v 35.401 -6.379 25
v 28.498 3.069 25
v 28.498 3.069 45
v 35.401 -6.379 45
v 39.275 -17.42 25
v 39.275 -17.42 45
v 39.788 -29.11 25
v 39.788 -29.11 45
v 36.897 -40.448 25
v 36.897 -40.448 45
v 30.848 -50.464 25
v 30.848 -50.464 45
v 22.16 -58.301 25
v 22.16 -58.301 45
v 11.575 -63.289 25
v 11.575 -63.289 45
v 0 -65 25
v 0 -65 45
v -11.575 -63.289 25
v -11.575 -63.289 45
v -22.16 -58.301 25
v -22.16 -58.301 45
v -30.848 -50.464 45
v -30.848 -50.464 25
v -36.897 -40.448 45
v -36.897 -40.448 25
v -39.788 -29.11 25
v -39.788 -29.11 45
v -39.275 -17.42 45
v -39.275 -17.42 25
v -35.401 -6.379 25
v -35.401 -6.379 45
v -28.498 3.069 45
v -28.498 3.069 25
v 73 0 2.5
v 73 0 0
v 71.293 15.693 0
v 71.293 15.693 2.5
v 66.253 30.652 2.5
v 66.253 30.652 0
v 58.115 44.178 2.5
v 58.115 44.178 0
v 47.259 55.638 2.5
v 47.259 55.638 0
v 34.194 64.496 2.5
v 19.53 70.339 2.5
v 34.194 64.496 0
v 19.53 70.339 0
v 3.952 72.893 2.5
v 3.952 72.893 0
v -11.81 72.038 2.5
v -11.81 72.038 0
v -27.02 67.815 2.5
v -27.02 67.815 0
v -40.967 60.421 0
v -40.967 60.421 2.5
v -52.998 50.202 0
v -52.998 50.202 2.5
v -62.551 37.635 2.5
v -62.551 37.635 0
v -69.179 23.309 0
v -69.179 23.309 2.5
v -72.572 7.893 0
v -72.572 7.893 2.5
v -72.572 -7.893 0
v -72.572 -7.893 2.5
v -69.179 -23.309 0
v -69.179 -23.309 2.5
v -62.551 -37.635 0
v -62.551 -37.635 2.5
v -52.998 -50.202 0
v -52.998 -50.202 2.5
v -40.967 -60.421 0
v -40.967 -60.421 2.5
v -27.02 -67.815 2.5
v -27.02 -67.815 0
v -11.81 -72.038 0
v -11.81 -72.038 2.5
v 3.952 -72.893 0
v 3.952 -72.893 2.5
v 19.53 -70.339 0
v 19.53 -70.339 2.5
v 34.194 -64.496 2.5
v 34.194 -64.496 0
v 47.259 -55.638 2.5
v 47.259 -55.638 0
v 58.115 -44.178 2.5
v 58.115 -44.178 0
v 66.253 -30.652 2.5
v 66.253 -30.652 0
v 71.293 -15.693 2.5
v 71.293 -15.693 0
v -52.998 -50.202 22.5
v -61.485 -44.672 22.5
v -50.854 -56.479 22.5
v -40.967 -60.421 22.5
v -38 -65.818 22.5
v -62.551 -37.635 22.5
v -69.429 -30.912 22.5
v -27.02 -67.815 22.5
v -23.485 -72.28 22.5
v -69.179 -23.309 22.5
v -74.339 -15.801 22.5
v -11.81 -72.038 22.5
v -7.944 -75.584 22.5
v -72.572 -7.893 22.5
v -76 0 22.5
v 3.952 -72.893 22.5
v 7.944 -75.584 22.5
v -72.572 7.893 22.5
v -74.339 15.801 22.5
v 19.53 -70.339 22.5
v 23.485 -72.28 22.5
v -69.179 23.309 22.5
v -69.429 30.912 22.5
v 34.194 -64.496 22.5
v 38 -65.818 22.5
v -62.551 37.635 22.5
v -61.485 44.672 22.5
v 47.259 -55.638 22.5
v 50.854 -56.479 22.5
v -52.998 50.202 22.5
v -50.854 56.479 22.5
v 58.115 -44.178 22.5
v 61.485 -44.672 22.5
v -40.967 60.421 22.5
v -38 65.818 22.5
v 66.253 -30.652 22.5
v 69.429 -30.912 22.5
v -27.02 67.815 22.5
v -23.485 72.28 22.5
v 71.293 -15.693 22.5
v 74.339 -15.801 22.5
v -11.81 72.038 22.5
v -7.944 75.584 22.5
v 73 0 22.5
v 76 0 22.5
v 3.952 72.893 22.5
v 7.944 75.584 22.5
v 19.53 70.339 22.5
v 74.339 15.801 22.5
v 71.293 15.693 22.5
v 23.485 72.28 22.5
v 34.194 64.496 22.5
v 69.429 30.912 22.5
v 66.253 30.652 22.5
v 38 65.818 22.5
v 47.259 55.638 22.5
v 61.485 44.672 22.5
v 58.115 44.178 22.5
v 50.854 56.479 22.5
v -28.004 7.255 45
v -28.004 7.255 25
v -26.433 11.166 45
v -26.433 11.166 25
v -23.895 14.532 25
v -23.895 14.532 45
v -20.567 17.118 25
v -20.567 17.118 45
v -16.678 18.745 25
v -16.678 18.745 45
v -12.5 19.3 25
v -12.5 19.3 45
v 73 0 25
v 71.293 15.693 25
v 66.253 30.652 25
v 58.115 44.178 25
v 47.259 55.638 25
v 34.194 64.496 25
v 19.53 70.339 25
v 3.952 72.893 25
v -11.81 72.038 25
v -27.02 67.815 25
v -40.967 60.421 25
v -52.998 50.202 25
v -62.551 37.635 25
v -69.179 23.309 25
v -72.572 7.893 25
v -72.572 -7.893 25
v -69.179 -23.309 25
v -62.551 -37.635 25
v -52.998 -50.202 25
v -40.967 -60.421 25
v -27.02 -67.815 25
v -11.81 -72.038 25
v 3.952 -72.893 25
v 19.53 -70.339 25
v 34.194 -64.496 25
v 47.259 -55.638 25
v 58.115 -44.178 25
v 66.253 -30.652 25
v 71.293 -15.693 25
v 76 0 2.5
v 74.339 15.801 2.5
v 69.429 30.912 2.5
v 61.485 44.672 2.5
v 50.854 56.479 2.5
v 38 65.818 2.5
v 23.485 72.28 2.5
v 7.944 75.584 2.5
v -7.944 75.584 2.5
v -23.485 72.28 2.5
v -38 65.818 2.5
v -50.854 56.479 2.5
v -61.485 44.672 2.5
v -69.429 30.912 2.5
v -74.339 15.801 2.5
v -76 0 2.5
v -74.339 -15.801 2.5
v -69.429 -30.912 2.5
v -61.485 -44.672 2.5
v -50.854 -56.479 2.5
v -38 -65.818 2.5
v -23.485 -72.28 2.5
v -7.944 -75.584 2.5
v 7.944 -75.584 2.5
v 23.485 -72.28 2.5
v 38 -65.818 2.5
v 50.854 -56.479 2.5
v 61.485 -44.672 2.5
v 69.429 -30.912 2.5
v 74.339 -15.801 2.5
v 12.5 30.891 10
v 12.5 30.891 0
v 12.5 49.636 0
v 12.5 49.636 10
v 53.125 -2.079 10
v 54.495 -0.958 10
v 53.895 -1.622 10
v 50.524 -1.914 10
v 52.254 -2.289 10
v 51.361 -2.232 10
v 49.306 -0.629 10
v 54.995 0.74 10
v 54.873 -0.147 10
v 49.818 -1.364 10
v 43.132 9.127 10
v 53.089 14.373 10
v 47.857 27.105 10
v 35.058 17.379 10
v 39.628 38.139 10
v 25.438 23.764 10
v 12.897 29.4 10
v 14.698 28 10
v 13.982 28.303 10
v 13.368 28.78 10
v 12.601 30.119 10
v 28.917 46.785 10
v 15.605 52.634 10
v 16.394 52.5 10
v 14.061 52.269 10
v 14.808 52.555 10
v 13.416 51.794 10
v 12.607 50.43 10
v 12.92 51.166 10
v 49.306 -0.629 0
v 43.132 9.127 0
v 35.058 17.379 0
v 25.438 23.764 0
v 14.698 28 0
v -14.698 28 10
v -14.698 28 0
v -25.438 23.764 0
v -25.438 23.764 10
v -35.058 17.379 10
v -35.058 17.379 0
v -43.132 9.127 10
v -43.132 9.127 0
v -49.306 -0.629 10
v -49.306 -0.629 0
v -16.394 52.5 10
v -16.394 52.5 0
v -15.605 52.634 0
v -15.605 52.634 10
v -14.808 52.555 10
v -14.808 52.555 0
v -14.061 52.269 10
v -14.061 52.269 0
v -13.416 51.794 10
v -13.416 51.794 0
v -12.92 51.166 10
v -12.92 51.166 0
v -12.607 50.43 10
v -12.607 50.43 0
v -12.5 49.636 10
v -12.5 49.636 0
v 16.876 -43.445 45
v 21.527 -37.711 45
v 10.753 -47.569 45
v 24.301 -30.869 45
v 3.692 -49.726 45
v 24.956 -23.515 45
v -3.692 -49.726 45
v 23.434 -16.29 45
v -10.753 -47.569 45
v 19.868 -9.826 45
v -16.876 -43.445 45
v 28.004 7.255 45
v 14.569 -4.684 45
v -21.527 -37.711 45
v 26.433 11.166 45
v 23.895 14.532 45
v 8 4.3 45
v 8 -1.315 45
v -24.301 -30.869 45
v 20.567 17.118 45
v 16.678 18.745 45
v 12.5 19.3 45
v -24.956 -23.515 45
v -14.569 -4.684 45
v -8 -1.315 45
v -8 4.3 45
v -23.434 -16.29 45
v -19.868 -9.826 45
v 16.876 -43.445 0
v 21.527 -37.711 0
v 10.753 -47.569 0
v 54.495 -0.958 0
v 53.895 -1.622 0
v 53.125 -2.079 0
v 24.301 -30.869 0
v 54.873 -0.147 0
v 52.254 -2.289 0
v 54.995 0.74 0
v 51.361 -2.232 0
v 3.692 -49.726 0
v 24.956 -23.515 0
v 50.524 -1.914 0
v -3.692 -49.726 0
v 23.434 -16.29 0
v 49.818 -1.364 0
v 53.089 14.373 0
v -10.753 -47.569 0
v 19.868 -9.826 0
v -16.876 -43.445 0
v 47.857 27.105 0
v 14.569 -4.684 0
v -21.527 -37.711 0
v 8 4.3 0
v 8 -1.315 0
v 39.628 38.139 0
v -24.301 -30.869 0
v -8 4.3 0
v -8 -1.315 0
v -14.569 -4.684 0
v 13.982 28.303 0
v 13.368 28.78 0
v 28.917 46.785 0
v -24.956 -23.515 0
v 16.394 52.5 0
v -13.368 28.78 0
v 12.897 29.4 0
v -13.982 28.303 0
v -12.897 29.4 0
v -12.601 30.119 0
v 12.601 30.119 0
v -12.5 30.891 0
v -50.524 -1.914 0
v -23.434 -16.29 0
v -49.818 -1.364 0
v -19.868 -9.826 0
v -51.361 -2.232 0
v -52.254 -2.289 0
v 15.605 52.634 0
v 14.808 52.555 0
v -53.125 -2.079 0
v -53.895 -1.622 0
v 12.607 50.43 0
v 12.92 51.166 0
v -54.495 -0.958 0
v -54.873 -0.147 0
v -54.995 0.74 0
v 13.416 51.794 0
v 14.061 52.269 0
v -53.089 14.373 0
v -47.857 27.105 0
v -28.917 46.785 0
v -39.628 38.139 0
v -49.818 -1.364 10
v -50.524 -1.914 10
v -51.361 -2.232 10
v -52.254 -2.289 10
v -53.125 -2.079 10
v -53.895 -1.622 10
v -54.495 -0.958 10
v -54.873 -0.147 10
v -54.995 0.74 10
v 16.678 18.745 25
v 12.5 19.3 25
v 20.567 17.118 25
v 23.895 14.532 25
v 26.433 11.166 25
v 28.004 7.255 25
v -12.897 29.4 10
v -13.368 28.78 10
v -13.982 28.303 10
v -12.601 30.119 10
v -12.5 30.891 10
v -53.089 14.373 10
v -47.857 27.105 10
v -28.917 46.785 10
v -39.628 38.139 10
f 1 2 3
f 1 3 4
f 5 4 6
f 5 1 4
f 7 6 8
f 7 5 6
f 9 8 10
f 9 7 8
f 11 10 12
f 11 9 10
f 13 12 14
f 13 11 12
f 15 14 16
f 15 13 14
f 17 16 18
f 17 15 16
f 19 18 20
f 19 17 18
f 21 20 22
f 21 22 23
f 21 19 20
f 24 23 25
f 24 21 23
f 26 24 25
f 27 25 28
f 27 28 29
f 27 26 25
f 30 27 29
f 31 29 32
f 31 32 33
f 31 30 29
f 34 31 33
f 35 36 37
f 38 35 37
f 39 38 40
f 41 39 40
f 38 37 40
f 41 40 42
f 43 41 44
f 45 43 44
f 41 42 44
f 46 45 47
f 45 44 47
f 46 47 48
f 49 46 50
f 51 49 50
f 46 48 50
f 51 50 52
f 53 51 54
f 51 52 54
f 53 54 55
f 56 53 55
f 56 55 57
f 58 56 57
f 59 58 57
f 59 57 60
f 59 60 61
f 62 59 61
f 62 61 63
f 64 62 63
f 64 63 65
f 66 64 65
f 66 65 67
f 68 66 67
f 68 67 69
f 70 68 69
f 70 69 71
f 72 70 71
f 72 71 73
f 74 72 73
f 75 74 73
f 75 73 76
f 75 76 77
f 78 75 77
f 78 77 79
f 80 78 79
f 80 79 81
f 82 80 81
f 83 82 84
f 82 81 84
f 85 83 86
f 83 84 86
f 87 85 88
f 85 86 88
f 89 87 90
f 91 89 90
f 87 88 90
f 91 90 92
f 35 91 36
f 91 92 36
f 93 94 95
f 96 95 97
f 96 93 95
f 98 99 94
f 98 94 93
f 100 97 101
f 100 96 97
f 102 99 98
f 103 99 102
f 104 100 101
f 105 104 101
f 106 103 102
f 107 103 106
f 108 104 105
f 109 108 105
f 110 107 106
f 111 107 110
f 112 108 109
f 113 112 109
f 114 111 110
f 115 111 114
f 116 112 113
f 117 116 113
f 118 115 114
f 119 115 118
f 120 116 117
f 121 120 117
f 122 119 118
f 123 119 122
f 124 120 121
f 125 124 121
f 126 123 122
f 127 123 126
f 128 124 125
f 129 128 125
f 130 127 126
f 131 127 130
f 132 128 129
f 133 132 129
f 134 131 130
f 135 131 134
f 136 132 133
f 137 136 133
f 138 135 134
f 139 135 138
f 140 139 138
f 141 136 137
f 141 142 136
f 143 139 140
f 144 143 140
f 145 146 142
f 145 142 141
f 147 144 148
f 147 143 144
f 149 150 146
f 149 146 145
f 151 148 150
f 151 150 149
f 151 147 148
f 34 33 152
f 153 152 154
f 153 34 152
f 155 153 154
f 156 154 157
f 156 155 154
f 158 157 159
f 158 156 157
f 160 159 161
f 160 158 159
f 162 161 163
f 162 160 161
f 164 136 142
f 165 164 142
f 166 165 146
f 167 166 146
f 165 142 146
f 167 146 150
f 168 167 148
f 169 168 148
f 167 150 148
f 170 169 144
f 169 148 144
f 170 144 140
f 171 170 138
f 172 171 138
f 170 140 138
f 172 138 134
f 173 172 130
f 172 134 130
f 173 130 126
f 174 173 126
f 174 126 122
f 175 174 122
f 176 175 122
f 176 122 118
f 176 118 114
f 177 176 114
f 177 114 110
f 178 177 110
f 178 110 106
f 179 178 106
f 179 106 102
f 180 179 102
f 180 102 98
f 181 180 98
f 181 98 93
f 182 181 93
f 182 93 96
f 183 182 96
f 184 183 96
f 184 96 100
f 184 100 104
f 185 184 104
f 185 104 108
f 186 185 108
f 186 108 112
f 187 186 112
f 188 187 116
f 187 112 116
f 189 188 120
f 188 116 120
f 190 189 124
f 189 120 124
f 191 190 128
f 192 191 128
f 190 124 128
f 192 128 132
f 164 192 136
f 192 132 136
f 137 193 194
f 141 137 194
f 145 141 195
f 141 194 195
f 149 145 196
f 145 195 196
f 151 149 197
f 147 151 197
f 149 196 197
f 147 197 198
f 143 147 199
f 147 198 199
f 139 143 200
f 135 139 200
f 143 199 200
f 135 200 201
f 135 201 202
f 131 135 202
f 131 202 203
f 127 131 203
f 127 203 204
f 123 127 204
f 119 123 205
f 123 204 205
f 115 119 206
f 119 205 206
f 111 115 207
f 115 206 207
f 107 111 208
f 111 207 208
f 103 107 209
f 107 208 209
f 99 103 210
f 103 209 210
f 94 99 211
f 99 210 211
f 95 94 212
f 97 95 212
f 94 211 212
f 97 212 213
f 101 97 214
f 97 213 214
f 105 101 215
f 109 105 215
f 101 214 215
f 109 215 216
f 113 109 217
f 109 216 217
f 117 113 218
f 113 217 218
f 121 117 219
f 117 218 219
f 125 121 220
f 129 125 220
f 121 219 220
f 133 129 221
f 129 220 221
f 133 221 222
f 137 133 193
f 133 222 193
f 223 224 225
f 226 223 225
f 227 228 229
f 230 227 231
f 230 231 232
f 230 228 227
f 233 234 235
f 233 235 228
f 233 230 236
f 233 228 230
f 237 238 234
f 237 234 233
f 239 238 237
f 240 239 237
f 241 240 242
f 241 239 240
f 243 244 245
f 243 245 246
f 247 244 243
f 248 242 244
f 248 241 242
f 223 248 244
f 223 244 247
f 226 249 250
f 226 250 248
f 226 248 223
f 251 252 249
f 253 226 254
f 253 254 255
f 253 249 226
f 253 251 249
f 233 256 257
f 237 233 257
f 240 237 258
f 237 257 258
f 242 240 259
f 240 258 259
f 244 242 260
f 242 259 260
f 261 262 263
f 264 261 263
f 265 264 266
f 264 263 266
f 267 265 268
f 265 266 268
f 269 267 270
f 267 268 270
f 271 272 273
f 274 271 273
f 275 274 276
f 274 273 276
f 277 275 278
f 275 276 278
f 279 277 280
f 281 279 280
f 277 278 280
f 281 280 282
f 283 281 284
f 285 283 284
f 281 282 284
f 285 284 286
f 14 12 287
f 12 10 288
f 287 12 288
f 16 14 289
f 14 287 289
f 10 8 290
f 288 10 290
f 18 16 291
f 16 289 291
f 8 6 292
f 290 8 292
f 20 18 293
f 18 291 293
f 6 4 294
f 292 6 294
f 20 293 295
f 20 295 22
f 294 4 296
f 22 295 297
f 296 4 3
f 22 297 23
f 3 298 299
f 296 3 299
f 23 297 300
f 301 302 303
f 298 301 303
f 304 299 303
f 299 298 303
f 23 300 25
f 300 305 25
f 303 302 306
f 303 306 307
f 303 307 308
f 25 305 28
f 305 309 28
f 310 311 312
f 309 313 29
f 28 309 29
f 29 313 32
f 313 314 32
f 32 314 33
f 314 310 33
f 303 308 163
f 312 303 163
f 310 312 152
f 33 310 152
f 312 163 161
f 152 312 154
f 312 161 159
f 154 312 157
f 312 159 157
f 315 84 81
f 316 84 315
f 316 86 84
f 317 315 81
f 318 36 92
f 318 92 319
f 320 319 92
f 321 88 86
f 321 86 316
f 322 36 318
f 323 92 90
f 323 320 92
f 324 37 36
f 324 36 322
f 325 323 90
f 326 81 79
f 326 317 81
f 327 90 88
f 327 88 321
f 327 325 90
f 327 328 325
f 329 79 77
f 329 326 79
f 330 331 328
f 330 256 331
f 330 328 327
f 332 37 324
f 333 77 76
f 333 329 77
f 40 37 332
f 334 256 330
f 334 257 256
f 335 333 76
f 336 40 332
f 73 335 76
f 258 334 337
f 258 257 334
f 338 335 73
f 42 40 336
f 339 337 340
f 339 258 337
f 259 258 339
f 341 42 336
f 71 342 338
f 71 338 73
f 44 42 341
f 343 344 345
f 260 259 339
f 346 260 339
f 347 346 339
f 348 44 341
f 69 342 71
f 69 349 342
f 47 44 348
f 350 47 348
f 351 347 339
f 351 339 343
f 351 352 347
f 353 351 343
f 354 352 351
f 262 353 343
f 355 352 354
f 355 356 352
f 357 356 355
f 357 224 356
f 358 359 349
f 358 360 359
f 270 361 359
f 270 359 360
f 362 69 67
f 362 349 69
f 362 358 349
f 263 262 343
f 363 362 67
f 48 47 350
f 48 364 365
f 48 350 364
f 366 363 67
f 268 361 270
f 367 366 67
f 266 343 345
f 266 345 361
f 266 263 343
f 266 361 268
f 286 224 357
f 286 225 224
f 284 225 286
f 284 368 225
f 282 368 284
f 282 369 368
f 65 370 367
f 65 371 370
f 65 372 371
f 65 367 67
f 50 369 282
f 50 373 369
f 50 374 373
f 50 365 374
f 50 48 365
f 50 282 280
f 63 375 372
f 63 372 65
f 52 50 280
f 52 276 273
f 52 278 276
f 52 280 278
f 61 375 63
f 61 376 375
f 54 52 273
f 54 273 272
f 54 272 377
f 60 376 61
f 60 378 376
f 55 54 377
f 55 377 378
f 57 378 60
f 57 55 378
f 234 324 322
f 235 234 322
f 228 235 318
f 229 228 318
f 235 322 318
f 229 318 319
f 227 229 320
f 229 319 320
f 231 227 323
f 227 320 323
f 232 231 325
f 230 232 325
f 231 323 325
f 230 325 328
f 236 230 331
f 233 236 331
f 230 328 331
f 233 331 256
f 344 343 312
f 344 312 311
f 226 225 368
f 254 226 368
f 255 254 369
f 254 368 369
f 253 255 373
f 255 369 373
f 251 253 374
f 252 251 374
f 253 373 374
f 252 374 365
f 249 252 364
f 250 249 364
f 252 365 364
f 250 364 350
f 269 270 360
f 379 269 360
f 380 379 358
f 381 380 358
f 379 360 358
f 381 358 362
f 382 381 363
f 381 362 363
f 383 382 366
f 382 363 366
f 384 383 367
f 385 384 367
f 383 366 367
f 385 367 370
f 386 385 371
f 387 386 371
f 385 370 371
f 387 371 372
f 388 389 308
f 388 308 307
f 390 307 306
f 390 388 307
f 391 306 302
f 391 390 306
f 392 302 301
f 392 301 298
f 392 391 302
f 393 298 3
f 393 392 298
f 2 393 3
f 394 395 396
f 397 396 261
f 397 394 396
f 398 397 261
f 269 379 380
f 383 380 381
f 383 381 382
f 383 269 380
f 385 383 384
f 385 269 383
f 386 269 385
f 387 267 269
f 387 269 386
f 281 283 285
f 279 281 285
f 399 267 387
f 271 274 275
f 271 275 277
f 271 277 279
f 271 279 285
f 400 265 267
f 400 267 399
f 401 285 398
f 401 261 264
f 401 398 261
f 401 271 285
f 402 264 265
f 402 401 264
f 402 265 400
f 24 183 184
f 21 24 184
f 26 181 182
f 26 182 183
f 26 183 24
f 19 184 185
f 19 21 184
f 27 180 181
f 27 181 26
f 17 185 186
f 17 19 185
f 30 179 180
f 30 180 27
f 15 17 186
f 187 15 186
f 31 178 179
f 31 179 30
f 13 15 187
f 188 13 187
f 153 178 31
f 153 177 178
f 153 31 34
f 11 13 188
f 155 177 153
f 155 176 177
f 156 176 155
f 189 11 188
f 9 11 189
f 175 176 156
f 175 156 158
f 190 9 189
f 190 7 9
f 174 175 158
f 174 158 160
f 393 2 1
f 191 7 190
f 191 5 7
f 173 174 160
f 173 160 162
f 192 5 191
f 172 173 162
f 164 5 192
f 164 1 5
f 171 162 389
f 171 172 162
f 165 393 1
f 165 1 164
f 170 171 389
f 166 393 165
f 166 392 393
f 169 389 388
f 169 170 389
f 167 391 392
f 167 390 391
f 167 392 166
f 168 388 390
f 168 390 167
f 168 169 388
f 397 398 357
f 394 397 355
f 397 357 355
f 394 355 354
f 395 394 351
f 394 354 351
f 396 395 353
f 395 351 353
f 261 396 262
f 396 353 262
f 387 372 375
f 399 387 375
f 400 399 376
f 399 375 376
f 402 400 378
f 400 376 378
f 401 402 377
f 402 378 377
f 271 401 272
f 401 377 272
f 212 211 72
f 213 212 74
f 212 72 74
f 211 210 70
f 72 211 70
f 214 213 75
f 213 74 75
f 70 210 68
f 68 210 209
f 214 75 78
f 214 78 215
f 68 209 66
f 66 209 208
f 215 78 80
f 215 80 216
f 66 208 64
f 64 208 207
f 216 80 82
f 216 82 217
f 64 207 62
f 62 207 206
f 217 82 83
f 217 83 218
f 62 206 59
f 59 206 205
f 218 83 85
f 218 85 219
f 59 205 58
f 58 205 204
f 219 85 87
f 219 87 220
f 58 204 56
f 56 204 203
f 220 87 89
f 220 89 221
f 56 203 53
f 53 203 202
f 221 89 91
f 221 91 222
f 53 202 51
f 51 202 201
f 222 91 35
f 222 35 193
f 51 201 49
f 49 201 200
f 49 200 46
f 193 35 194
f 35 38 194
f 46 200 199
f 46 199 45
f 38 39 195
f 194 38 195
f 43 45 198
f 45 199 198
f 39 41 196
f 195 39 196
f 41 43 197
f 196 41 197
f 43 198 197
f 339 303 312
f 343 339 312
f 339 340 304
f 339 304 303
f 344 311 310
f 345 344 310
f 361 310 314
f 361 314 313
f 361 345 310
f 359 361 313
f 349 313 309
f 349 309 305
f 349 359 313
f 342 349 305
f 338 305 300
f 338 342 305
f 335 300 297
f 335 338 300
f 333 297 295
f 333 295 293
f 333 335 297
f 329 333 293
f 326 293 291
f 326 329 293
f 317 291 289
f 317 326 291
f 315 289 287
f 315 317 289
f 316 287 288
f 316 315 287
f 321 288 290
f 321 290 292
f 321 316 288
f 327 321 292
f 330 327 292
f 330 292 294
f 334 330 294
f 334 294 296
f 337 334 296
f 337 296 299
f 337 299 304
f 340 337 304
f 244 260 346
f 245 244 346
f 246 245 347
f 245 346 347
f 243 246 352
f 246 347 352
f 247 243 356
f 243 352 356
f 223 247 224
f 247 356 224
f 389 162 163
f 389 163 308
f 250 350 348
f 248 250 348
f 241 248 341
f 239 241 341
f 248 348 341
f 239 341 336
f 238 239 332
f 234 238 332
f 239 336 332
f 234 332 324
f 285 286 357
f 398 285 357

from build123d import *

# Parameters (mm, degrees)
SKETCH1_R           = 73
BOSS_EXTRUDE1_DEPTH = 25
BOSS_EXTRUDE2_START = 2.5
SKETCH1_3_R         = 76
SKETCH1_3_R_2       = 73
BOSS_EXTRUDE2_DEPTH = 20
BOSS_EXTRUDE3_DEPTH = 45
CUT_EXTRUDE1_DEPTH  = 10


with BuildPart() as part:
    # Sketch1 → Boss-Extrude1 (new body)
    with BuildSketch(Plane.XY):
        Circle(SKETCH1_R)
        with BuildLine():
            ThreePointArc((-28.498326366, 3.06858376), (-23.895232771, 14.5315925), (-12.5, 19.3))
            Line((-12.5, 19.3), (12.5, 19.3))
            ThreePointArc((12.5, 19.3), (23.895232771, 14.5315925), (28.498326366, 3.06858376))
            ThreePointArc((28.498326366, 3.06858376), (0, -65), (-28.498326366, 3.06858376))
        make_face(mode=Mode.SUBTRACT)
    extrude(amount=BOSS_EXTRUDE1_DEPTH)

    # Sketch1<3> → Boss-Extrude2 (add)
    with BuildSketch(Plane.XY.offset(BOSS_EXTRUDE2_START)):
        Circle(SKETCH1_3_R)
        Circle(SKETCH1_3_R_2, mode=Mode.SUBTRACT)
    extrude(amount=BOSS_EXTRUDE2_DEPTH)

    # Sketch1<4> → Boss-Extrude3 (add)
    with BuildSketch(Plane.XY):
        with BuildLine():
            Line((12.5, 19.3), (-12.5, 19.3))
            ThreePointArc((-12.5, 19.3), (-23.895232771, 14.5315925), (-28.498326366, 3.06858376))
            ThreePointArc((-28.498326366, 3.06858376), (0, -65), (28.498326366, 3.06858376))
            ThreePointArc((28.498326366, 3.06858376), (23.895232771, 14.5315925), (12.5, 19.3))
        make_face()
        with BuildLine():
            Line((-8, -1.314561435), (-8, 4.3))
            Line((-8, 4.3), (8, 4.3))
            Line((8, 4.3), (8, -1.314561435))
            ThreePointArc((8, -1.314561435), (0, -50), (-8, -1.314561435))
        make_face(mode=Mode.SUBTRACT)
    extrude(amount=BOSS_EXTRUDE3_DEPTH)

    # Sketch1<5> → Cut-Extrude1 (cut)
    with BuildSketch(Plane.XY):
        with BuildLine():
            ThreePointArc((16.394230769, 52.49980188), (13.722739792, 52.053064023), (12.5, 49.636176323))
            Line((12.5, 49.636176323), (12.5, 30.890517979))
            ThreePointArc((12.5, 30.890517979), (13.111991163, 29.074639736), (14.698275862, 27.999629118))
            ThreePointArc((14.698275862, 27.999629118), (35.057623034, 17.378804457), (49.305876787, -0.629310345))
            ThreePointArc((49.305876787, -0.629310345), (52.697492054, -2.21666073), (54.995016416, 0.740384615))
            ThreePointArc((54.995016416, 0.740384615), (44.089289769, 32.880610208), (16.394230769, 52.49980188))
        make_face()
        with BuildLine():
            Line((-12.5, 30.890517979), (-12.5, 49.636176323))
            ThreePointArc((-12.5, 49.636176323), (-13.722739792, 52.053064023), (-16.394230769, 52.49980188))
            ThreePointArc((-16.394230769, 52.49980188), (-44.089289769, 32.880610208), (-54.995016416, 0.740384615))
            ThreePointArc((-54.995016416, 0.740384615), (-52.697492054, -2.21666073), (-49.305876787, -0.629310345))
            ThreePointArc((-49.305876787, -0.629310345), (-35.057623034, 17.378804457), (-14.698275862, 27.999629118))
            ThreePointArc((-14.698275862, 27.999629118), (-13.111991163, 29.074639736), (-12.5, 30.890517979))
        make_face()
    extrude(amount=CUT_EXTRUDE1_DEPTH, mode=Mode.SUBTRACT)


solid = part.part
